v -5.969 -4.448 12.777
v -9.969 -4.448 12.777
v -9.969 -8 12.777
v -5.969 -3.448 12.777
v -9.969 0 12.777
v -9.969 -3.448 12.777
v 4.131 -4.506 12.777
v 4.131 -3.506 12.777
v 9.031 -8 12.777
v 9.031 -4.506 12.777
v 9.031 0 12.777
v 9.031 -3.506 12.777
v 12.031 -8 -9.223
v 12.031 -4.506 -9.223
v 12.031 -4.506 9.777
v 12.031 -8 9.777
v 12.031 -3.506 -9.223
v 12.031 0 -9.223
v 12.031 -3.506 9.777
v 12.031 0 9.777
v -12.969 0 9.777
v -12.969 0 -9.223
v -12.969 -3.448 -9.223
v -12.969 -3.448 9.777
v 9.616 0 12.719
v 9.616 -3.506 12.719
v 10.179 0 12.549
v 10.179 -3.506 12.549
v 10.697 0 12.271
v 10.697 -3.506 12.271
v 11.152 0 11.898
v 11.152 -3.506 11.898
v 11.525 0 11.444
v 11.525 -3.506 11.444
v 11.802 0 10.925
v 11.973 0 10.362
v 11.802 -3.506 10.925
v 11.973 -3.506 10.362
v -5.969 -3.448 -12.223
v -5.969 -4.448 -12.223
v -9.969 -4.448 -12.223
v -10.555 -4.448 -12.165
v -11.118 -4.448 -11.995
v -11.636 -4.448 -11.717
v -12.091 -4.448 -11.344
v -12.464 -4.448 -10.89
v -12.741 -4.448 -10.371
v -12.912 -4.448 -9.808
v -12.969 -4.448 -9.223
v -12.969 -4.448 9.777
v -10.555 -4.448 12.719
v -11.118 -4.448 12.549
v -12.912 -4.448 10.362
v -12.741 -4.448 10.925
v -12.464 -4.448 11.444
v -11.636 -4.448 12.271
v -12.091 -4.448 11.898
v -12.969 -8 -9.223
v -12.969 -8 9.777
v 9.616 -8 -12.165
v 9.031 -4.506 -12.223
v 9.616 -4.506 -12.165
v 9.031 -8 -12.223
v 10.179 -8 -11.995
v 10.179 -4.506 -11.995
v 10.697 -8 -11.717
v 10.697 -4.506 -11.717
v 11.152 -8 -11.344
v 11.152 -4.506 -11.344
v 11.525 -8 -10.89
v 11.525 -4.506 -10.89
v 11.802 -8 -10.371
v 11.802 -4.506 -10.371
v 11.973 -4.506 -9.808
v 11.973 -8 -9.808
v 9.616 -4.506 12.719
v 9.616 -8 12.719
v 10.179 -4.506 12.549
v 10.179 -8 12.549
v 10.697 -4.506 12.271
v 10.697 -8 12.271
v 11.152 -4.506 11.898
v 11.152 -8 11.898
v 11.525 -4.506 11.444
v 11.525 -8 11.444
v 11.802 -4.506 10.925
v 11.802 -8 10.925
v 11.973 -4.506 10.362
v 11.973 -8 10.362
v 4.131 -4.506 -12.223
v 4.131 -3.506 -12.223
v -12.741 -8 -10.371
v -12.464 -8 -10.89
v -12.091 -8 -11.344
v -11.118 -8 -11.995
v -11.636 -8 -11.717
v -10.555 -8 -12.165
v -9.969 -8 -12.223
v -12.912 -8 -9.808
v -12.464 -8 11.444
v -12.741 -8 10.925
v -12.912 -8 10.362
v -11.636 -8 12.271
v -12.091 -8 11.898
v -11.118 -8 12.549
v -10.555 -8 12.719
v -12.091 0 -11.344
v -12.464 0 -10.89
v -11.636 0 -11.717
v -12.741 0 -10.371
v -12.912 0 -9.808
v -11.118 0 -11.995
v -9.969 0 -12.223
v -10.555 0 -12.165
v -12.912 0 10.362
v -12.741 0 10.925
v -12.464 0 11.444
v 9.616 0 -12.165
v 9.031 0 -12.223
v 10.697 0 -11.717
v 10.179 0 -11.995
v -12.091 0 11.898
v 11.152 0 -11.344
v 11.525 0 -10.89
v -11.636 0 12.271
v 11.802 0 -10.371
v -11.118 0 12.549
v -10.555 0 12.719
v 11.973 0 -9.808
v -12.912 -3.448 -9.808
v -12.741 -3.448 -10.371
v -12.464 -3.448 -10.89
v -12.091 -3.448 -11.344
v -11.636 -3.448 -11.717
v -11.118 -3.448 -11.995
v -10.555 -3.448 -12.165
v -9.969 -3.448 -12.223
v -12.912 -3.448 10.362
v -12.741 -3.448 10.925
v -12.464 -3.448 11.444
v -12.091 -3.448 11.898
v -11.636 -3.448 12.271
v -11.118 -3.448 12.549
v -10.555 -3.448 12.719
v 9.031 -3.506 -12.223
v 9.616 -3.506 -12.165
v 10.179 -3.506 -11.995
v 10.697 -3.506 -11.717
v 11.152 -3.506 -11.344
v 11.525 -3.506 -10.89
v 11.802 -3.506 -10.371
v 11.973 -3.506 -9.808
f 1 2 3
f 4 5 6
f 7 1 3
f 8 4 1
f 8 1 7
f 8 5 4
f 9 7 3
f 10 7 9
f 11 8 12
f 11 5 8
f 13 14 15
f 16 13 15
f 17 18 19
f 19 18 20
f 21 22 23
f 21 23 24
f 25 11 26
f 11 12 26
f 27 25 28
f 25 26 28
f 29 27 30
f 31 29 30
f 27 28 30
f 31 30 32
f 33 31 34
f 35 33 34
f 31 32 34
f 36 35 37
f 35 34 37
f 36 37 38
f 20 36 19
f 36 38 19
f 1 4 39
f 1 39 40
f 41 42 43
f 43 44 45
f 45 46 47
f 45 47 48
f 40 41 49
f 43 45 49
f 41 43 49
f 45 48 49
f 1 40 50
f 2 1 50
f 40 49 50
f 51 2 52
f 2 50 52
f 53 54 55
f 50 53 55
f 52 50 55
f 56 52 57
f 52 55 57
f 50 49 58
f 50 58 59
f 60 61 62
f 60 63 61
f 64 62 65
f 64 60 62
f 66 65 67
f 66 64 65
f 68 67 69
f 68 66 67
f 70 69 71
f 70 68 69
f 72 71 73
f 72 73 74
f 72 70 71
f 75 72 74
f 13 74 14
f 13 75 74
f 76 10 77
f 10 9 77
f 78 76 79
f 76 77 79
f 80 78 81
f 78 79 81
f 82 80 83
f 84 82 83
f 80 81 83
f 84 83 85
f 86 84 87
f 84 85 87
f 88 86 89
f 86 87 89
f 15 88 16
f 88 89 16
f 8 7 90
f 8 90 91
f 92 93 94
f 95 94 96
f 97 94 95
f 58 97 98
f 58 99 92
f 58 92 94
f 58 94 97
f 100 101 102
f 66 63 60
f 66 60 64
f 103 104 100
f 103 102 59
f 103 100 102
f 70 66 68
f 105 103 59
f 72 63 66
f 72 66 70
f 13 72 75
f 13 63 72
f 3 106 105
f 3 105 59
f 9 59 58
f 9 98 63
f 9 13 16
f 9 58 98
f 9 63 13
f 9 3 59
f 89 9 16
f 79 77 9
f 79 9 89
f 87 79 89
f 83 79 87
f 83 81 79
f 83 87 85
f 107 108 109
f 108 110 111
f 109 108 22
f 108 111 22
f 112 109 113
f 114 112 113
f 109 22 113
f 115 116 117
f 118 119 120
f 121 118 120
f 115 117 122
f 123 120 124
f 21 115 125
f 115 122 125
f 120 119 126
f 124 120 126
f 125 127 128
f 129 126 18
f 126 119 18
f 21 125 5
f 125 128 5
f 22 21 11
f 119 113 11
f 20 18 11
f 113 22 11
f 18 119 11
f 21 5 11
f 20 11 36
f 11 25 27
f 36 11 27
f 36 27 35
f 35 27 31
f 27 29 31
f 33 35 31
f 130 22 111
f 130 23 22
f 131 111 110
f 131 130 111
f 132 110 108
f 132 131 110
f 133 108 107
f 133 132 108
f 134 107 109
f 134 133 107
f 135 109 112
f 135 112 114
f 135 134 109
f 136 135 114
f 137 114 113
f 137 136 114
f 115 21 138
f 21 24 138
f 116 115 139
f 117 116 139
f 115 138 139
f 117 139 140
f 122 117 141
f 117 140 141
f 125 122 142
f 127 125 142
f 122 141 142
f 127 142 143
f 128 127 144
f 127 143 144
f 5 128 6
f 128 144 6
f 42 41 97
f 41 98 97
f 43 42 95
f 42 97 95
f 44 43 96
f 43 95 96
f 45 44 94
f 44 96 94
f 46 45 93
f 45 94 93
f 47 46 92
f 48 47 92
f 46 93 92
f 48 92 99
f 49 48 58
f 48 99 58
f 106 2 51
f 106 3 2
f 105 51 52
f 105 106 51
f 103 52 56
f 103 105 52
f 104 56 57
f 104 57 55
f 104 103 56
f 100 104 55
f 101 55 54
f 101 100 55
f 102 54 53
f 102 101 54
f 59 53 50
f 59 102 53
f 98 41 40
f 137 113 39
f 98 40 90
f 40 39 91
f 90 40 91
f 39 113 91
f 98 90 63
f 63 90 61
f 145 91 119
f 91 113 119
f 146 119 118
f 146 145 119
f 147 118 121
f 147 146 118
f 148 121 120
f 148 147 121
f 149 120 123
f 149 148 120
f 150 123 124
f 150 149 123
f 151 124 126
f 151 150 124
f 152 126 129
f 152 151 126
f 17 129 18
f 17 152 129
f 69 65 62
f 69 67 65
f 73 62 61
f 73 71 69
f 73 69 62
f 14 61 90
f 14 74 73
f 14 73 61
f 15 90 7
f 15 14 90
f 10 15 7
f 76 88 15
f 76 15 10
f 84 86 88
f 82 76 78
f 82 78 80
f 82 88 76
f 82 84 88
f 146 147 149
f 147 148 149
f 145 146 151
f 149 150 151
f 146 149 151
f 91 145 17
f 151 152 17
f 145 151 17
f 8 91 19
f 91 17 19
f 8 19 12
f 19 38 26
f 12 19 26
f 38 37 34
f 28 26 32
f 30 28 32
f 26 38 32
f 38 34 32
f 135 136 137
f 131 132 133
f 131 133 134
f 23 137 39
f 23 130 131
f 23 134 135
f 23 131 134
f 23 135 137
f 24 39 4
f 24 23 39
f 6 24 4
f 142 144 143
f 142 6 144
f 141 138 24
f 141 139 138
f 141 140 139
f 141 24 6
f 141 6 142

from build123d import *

# Parameters (mm, degrees)
F0_W     = 25
F0_H     = 25
F1_DEPTH = 8
F2_W     = 1
F2_H     = 25
F3_DEPTH = 7
F4_W     = 1
F4_H     = 25
F5_DEPTH = 7.9
F6_R     = 3


with BuildPart() as f1:
    # F0 (on Front) → F1 (new body)
    with BuildSketch(Plane.XZ):
        with Locations((-0.469491, 0.276955)):
            Rectangle(F0_W, F0_H)
    extrude(amount=F1_DEPTH)

    # F2 (on face) → F3 (cut)
    with BuildSketch(Plane(origin=(-12.969491, 0, 0), x_dir=(0, -1, 0), z_dir=(-1, 0, 0))):
        with Locations((3.948362, 0.276955)):
            Rectangle(F2_W, F2_H)
    extrude(amount=-F3_DEPTH, mode=Mode.SUBTRACT)

    # F4 (on face) → F5 (cut)
    with BuildSketch(Plane.YZ.offset(12.030509)):
        with Locations((-4.006481, 0.276955)):
            Rectangle(F4_W, F4_H)
    extrude(amount=-F5_DEPTH, mode=Mode.SUBTRACT)

    # F6
    f6_edges = [f1.edges().sort_by_distance(p)[0] for p in [
        (-12.969491, -1.724181, 12.776955),
        (-12.969491, -6.224181, 12.776955),
        (12.030509, -6.25324, 12.776955),
        (12.030509, -1.75324, 12.776955),
        (12.030509, -6.25324, -12.223045),
        (12.030509, -1.75324, -12.223045),
        (-12.969491, -1.724181, -12.223045),
        (-12.969491, -6.224181, -12.223045),
    ]]
    fillet(f6_edges, radius=F6_R)


solid = f1.part
